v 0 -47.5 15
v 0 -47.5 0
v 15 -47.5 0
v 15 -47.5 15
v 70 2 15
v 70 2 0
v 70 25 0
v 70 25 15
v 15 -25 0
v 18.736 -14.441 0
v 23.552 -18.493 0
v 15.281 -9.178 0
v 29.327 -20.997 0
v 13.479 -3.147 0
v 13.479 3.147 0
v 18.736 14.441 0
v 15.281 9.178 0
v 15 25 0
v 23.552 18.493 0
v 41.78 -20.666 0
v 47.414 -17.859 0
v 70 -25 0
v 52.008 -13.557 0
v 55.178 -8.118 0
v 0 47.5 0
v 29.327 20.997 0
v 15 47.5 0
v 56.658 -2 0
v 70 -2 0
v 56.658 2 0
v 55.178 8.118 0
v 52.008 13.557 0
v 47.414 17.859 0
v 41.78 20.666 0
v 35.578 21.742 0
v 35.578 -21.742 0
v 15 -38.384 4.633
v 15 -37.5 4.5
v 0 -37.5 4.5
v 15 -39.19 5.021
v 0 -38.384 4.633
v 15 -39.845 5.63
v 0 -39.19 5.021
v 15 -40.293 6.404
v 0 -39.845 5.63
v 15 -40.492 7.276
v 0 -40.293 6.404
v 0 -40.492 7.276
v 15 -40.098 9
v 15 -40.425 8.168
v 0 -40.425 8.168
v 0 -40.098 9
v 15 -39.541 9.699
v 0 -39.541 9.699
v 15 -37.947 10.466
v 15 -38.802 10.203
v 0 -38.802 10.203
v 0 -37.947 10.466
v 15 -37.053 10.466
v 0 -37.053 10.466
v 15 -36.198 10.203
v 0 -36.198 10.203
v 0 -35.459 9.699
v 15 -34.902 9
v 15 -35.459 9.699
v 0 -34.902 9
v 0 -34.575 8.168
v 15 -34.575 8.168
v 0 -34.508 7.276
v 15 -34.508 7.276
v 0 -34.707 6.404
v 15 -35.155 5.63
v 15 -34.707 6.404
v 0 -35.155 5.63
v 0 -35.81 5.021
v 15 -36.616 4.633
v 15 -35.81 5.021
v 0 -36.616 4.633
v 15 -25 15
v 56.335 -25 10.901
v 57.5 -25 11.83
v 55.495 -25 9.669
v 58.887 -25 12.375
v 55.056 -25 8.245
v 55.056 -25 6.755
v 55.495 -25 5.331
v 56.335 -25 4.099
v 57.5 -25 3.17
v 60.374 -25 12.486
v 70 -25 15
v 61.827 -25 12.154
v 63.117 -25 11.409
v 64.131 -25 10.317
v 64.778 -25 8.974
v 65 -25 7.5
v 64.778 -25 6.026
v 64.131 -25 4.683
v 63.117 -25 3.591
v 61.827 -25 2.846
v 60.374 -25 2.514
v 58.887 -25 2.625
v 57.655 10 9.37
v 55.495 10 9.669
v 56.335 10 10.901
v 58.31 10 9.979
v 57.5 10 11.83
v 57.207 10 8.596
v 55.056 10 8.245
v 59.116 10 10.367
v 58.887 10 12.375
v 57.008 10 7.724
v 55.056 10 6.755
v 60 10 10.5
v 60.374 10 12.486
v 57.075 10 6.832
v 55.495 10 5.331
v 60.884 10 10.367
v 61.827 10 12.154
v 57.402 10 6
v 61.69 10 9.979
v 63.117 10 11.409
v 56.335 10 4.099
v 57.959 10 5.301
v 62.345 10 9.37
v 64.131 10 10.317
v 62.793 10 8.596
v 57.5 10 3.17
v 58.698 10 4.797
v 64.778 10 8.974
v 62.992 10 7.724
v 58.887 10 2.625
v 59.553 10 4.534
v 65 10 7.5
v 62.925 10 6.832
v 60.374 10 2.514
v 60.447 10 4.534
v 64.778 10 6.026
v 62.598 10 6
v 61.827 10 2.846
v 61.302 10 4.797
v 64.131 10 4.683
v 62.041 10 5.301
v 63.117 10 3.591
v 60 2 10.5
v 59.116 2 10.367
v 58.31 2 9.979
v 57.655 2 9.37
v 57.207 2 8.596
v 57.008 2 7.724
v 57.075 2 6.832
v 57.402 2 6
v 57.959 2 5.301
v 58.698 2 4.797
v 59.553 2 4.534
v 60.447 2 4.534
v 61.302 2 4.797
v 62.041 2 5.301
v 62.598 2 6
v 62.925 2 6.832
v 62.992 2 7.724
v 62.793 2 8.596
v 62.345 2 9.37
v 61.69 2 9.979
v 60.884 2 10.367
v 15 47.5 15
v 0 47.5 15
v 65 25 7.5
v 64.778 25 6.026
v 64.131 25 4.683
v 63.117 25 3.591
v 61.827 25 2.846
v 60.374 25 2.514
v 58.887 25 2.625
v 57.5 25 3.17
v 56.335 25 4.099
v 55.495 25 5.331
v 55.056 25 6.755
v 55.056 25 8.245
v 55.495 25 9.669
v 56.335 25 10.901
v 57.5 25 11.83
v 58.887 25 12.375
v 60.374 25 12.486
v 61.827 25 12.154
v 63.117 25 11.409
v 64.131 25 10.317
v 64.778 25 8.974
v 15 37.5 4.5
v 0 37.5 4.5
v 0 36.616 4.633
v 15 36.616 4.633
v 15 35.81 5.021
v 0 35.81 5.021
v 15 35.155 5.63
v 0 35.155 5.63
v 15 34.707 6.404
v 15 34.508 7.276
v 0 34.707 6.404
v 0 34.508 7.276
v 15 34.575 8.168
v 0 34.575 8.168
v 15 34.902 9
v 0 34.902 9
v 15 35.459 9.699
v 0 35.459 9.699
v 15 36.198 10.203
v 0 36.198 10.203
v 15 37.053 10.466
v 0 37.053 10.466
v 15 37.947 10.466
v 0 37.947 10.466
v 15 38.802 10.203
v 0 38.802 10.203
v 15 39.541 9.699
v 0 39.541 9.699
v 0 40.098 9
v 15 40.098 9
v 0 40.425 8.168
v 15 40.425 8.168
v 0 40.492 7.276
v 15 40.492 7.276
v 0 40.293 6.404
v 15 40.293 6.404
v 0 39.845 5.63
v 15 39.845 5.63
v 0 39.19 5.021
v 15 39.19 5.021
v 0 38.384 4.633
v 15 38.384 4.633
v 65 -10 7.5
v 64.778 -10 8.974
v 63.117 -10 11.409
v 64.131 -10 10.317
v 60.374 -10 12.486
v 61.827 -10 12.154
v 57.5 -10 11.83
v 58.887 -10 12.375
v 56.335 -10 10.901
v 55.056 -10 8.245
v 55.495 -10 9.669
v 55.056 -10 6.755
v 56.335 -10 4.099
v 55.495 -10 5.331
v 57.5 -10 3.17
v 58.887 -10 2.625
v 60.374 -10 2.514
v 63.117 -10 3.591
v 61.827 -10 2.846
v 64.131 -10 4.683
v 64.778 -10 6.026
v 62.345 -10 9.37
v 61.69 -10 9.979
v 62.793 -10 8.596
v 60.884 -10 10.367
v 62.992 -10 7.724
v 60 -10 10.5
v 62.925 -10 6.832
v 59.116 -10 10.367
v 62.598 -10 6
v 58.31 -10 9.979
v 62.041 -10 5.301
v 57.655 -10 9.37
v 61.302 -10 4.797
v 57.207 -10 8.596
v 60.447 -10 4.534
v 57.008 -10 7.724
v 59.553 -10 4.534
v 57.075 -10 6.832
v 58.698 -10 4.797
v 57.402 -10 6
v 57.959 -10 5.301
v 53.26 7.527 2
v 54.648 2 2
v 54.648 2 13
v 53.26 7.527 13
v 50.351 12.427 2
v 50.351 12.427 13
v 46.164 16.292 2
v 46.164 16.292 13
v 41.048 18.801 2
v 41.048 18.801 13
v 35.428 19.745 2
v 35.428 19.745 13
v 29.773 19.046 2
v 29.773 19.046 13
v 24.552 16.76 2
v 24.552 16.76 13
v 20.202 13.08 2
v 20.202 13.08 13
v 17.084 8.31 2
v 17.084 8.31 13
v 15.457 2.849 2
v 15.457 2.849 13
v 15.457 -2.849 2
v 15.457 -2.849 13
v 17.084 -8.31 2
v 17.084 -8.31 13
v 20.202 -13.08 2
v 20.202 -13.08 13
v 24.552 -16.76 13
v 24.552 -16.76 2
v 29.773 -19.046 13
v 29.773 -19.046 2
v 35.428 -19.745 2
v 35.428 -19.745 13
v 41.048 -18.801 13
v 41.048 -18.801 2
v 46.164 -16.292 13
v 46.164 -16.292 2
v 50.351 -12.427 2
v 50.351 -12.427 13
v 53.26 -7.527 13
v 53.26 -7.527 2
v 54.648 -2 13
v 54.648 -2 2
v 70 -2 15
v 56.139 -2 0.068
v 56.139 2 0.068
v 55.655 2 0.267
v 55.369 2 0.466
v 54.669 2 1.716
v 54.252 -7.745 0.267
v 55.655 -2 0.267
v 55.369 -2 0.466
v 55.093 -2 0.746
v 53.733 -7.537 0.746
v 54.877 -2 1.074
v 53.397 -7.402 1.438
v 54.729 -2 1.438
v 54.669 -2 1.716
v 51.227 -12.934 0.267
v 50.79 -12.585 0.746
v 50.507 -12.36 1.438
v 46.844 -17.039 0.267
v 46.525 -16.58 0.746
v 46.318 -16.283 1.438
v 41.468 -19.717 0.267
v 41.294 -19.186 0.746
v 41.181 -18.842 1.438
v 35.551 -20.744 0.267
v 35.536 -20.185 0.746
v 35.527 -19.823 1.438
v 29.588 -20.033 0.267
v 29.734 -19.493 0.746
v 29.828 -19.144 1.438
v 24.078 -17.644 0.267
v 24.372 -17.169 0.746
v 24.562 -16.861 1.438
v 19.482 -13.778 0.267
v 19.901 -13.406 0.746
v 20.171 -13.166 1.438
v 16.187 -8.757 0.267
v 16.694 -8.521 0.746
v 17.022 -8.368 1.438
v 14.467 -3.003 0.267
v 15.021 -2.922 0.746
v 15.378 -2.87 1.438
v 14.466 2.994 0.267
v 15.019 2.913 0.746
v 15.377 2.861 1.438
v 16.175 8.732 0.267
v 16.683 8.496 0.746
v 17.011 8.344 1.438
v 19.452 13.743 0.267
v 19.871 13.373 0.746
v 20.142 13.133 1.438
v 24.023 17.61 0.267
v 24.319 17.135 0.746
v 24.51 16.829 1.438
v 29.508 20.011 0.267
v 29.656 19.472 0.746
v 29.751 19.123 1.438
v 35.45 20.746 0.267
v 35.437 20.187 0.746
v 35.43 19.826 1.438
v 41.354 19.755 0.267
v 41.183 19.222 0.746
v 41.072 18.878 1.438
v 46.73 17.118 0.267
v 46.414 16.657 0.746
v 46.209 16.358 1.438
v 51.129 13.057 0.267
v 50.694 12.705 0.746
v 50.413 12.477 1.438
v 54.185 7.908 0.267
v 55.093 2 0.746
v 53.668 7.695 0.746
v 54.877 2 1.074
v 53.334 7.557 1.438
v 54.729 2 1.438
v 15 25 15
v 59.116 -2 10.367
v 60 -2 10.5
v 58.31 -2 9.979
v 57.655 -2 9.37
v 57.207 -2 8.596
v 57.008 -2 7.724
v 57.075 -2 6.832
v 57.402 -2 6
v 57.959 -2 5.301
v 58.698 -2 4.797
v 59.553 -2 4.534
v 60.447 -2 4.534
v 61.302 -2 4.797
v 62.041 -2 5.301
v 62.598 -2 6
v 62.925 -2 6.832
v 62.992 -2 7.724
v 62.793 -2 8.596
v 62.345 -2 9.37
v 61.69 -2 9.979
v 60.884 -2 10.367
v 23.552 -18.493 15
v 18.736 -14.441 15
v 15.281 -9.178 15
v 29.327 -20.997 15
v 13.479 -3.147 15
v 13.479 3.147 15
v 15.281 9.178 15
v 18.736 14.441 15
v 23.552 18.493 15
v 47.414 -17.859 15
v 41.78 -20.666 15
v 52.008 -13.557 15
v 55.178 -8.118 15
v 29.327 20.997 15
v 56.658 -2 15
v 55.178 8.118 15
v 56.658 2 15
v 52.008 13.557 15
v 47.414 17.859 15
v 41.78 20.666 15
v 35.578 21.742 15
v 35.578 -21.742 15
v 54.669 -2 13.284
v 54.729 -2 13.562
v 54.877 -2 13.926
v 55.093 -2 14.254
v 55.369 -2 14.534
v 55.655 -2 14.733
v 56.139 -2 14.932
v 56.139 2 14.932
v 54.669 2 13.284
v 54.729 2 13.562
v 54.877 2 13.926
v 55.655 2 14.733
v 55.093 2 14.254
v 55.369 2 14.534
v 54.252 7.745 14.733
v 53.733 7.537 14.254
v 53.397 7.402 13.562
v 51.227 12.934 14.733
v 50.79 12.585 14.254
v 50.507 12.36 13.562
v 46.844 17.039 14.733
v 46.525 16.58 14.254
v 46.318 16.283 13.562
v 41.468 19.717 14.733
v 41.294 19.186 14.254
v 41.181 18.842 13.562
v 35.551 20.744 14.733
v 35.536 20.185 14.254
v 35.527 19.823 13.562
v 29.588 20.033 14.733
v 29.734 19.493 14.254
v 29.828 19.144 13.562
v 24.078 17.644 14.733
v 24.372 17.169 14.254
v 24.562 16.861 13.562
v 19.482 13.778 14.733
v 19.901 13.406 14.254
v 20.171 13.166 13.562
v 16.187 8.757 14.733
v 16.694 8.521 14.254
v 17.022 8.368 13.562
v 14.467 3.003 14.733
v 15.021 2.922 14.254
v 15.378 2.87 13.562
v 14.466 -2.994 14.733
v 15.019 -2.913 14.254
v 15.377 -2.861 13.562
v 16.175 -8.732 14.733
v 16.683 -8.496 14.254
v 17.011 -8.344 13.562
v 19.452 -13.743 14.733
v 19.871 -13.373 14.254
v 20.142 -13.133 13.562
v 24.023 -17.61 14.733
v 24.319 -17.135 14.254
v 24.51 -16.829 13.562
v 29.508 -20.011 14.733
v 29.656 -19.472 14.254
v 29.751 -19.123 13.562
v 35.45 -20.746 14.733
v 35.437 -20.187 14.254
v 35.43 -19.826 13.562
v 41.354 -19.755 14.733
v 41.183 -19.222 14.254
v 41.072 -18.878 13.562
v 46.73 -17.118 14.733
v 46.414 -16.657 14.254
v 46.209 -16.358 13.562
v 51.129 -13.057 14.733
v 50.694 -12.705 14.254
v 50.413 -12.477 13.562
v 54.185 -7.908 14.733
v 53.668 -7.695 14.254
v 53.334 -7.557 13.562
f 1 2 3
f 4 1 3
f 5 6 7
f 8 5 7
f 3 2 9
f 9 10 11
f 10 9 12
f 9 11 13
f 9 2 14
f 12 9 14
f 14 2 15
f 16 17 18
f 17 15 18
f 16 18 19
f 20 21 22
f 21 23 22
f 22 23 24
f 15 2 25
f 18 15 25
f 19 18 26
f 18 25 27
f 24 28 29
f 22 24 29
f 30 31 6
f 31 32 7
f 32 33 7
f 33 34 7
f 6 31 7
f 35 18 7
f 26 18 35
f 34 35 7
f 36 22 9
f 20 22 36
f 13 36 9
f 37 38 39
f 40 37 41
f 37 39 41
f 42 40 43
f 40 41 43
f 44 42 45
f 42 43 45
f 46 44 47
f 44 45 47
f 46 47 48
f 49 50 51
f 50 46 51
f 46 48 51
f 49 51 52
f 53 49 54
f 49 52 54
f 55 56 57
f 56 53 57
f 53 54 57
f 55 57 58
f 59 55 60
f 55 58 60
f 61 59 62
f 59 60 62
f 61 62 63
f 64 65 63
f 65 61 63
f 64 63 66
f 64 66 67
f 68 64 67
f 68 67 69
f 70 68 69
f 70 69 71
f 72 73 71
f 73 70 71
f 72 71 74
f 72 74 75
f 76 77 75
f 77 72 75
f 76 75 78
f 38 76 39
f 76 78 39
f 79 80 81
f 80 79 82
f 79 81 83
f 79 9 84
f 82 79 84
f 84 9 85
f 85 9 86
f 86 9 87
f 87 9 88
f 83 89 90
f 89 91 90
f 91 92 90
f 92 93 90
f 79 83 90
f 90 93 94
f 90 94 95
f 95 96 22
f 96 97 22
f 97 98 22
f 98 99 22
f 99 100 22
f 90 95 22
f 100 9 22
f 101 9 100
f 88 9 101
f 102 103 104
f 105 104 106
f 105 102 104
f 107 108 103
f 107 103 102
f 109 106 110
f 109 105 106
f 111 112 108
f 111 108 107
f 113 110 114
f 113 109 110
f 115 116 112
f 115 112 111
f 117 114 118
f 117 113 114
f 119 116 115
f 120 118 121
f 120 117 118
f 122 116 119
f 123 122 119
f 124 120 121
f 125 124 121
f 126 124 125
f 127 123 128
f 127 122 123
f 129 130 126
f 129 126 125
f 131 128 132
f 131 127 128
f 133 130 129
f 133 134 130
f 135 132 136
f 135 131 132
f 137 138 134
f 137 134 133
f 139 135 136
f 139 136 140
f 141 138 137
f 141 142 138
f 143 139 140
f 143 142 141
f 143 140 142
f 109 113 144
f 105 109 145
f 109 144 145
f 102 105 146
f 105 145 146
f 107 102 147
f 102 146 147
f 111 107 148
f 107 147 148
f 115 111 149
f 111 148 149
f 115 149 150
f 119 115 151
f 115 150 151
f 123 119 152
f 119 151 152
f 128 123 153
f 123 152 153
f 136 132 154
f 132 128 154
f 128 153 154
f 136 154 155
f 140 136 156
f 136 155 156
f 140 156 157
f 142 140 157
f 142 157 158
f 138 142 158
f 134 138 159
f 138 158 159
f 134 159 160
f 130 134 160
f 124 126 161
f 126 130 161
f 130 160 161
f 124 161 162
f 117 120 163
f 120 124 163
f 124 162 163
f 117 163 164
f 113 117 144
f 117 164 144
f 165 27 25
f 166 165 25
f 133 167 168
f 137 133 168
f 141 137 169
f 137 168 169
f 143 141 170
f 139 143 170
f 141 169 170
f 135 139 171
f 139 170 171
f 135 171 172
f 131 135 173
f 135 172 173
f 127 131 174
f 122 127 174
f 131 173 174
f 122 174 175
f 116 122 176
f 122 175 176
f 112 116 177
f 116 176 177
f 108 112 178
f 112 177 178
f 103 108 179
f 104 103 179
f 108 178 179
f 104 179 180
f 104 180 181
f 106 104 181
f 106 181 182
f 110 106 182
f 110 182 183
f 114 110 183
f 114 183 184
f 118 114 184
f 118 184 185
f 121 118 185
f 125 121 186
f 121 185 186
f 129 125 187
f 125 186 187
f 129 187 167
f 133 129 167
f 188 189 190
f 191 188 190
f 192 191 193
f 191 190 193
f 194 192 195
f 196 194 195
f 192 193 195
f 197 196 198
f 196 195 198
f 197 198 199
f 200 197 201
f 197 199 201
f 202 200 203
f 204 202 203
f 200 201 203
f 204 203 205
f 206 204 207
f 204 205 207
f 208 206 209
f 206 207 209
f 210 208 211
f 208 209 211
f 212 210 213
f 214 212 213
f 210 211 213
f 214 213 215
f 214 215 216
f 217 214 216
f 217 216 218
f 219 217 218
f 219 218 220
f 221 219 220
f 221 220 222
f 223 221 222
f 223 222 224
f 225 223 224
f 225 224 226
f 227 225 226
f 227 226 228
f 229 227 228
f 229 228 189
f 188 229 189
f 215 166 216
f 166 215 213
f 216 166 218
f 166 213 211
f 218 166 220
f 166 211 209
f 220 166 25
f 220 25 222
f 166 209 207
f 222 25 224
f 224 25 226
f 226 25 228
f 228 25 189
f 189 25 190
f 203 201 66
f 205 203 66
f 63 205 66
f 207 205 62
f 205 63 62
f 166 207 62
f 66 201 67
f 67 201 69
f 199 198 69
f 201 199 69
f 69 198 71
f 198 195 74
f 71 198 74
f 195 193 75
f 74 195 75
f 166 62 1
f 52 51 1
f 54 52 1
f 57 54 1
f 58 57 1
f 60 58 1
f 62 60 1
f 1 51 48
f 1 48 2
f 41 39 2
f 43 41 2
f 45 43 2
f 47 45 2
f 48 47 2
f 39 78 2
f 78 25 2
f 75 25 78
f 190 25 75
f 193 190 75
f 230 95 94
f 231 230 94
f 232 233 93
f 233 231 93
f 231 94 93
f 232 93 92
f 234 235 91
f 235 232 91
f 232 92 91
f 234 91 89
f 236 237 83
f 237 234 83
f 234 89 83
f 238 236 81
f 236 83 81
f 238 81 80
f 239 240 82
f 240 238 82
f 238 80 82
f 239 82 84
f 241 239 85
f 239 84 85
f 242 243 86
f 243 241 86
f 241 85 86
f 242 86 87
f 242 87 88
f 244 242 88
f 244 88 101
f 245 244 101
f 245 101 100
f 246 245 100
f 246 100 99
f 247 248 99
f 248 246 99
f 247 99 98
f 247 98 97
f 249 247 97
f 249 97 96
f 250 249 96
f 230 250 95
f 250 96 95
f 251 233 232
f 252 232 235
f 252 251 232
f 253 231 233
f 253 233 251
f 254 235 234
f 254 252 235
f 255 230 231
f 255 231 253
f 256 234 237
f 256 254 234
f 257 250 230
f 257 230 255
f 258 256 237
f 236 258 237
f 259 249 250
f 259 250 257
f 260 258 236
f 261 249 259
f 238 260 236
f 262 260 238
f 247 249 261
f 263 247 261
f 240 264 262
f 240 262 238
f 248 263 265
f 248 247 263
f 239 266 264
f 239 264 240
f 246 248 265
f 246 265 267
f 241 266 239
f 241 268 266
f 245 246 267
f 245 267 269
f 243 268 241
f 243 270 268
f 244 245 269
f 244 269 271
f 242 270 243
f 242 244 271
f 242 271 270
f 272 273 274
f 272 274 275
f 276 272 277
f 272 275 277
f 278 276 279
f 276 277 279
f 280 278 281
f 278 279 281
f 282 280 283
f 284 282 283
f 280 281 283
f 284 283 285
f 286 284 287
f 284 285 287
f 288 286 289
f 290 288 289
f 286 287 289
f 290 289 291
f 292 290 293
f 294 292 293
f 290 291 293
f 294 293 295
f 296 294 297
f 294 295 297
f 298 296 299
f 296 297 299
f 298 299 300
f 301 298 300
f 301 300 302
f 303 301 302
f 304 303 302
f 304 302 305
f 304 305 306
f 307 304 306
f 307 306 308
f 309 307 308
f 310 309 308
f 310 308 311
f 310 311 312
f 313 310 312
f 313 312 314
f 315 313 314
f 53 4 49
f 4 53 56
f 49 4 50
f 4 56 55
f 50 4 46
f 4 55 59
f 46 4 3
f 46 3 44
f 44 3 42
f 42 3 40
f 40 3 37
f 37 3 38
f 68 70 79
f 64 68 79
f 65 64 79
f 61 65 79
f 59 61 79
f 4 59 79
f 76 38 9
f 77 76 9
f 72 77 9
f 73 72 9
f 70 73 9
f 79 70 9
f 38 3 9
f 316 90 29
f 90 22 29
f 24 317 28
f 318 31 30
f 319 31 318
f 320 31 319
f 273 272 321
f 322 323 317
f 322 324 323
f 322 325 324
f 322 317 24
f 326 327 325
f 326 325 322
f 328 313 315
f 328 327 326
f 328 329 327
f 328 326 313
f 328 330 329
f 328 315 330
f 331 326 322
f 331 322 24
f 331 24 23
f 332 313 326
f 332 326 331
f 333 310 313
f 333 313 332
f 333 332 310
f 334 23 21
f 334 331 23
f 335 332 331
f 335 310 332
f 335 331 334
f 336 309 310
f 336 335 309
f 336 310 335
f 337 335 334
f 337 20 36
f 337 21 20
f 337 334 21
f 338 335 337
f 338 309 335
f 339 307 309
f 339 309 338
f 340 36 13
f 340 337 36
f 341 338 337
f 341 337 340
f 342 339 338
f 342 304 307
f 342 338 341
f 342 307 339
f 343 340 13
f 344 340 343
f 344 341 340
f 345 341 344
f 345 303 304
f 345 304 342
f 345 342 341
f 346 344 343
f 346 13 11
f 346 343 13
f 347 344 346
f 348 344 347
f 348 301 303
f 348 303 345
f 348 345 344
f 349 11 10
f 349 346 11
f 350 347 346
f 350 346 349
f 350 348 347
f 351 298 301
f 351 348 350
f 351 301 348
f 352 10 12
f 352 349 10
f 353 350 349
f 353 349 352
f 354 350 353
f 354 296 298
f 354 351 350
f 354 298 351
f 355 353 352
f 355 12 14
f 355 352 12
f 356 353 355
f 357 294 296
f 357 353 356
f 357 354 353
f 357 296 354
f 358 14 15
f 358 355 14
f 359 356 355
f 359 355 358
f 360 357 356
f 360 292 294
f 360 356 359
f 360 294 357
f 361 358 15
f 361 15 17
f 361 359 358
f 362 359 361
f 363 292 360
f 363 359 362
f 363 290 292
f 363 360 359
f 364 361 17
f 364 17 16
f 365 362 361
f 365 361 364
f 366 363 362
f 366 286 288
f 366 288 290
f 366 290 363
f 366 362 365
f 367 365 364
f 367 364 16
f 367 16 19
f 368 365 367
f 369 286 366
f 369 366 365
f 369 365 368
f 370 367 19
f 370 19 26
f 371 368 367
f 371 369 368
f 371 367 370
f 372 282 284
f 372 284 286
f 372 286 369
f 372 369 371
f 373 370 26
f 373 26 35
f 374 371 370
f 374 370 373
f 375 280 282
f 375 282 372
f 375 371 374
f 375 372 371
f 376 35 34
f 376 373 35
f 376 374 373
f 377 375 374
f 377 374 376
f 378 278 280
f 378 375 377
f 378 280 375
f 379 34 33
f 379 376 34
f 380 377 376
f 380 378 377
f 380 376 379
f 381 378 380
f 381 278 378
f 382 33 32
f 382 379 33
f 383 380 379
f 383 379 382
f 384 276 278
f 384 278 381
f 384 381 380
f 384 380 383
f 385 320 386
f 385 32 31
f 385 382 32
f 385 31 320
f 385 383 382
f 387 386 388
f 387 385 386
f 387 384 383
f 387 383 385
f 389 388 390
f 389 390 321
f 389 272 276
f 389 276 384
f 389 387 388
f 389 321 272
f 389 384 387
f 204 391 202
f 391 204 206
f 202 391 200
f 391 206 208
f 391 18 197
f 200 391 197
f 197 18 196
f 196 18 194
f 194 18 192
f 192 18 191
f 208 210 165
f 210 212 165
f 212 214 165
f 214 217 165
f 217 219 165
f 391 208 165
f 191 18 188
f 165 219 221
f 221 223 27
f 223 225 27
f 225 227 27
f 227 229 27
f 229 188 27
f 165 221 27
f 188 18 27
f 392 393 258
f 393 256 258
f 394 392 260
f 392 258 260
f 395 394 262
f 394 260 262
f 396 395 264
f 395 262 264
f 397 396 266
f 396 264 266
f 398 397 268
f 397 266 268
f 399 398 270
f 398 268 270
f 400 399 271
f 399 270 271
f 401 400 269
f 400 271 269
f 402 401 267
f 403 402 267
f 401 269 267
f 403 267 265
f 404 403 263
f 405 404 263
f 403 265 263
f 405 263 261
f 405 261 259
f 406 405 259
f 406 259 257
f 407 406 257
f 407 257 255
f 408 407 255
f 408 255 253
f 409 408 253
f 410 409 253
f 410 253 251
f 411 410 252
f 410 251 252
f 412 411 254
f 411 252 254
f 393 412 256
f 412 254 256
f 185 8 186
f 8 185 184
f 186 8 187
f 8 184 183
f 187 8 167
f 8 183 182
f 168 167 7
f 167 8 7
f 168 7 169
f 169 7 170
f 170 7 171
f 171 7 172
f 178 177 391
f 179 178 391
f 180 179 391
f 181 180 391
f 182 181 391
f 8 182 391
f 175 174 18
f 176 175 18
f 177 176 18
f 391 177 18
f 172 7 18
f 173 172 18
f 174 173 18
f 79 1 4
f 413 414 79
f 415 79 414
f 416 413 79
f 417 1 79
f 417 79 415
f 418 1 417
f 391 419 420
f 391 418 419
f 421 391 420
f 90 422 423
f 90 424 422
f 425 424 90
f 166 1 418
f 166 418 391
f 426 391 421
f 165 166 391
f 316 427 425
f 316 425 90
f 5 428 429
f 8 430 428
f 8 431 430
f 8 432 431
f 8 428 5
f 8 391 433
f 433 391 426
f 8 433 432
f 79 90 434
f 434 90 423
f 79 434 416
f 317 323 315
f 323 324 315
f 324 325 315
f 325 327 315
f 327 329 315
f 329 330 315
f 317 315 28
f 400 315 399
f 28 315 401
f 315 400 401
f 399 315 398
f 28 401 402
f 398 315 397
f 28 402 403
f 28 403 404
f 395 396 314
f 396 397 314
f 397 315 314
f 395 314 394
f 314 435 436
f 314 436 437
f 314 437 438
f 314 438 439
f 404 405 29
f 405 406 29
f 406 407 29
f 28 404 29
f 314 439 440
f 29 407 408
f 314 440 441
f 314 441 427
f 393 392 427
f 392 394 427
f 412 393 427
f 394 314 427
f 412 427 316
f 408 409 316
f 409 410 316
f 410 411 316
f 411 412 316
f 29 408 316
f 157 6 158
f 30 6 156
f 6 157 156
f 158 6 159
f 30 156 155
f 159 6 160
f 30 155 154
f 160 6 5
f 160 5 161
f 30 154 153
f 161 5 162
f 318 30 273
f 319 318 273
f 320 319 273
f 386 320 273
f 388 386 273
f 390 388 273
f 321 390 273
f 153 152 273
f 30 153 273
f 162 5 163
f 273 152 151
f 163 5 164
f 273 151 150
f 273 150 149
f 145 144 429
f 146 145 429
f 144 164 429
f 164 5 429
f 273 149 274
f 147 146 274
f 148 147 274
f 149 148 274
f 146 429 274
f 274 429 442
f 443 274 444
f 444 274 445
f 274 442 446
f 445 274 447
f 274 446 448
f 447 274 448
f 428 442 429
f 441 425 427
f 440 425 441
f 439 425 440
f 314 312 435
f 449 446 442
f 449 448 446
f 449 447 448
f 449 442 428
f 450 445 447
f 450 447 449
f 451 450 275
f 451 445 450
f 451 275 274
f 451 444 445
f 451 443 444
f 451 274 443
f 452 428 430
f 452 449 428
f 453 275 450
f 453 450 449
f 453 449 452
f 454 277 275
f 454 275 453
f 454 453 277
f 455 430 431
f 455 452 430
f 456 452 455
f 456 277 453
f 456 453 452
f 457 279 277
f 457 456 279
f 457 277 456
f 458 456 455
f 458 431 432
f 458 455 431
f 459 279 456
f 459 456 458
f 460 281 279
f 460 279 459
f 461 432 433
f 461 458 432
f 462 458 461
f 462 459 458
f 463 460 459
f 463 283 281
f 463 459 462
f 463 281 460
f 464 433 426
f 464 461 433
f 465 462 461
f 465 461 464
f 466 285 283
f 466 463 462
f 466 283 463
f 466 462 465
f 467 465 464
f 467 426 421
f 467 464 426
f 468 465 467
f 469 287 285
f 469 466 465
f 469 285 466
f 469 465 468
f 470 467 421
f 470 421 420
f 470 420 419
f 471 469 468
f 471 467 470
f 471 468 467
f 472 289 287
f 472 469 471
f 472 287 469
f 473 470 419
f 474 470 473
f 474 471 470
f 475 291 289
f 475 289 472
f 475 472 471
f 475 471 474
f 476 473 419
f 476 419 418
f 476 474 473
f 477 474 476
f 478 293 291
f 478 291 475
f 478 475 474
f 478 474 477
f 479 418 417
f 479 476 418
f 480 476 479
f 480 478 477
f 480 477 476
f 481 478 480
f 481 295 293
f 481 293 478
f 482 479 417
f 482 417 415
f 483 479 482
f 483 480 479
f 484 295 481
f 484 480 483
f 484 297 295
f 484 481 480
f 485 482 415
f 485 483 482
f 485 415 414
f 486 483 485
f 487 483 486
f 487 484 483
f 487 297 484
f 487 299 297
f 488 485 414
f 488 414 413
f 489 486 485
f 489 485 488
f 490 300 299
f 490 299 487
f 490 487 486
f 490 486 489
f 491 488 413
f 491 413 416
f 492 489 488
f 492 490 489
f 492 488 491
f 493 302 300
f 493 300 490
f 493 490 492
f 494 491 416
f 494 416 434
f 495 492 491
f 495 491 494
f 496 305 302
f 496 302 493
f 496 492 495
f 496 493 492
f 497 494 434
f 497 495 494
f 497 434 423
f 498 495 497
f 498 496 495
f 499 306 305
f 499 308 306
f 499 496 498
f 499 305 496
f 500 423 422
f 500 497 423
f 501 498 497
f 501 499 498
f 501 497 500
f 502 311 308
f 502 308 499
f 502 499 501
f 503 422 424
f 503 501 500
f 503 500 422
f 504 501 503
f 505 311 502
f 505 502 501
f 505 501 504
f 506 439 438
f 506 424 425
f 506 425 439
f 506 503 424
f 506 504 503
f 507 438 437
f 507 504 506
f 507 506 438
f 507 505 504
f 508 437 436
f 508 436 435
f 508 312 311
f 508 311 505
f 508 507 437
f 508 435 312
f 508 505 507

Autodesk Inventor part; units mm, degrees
ref_plane "YZ Plane" through (0, 0, 0) normal (1, 0, 0) x (0, 1, 0)
ref_plane "XZ Plane" through (0, 0, 0) normal (0, 1, 0) x (-1, 0, 0)
ref_plane "XY Plane" through (0, 0, 0) normal (0, 0, 1) x (1, 0, 0)
sketch "Sketch1" plane through (0, 0, 0) normal (0, 0, 1) x (1, 0, 0)
  line L0 (0, 0) -> (70, 0)
  line L1 (70, 0) -> (70, 25)
  line L2 (70, 25) -> (15, 25)
  line L3 (15, 25) -> (15, 47.5)
  line L4 (15, 47.5) -> (0, 47.5)
  line L5 (0, 47.5) -> (0, 0)
  point P0 (15, 36.25)
  point P1 (7.5, 47.5)
  dimension "d0" = 15
  dimension "d1" = 25
  dimension "d2" = 47.5
  dimension "d24" = 55
extrude "Extrusion1" add sketch "Sketch1" along normal blind 15
mirror "Mirror1" about plane through (0, 0, 0) normal (0, 1, 0) of "Extrusion1"
sketch "Sketch2" plane through (0, 0, 15) normal (0, 0, 1) x (1, 0, 0)
  circle A0 centre (35, 0) radius 19.75
  line L0 (-14, 0) -> (84, 0) projected
  line L1 (70, 25) -> (70, -25) projected
  line L2 (70, 2) -> (35, 2)
  line L3 (35, 2) -> (35, -2)
  line L4 (35, -2) -> (70, -2)
  line L5 (70, -2) -> (70, 2)
  point P0 (0, 0)
  point P1 (52.5, 2)
  point P2 (54.6485, 2)
  point P3 (54.6485, -2)
  dimension "d6" = 39.5
  dimension "d7" = 35
  dimension "d8" = 4
  dimension "d9" = 2
extrude "Extrusion2" cut sketch "Sketch2" against normal through all
sketch "Sketch3" plane through (15, 25, 0) normal (0, 1, 0) x (1, 0, 0)
  line L0 (55, 0) -> (0, 0) projected
  line L1 (55, 0) -> (55, -15) projected
  point P0 (-15, 0)
  point P1 (45, -7.5)
  dimension "d12" = 7.5
  dimension "d13" = 10
hole "Hole1" at (60, 25, 7.5) direction (0, -1, 0) diameter 6 end through all
sketch "Sketch4" plane through (15, 25, 0) normal (0, 1, 0) x (1, 0, 0)
  circle A0 centre (45, -7.5) radius 3 projected
  circle A1 centre (45, -7.5) radius 5
  point P0 (-15, 0)
  dimension "d21" = 10
extrude "Extrusion3" cut sketch "Sketch4" against normal blind 15
mirror "Mirror2" about plane through (0, 0, 0) normal (0, 1, 0) of "Extrusion3"
sketch "Sketch5" plane through (15, 25, 0) normal (1, 0, 0) x (0, 0, -1)
  line L0 (0, 0) -> (0, 22.5) projected
  line L1 (0, 22.5) -> (-15, 22.5) projected
  point P0 (0, -25)
  point P1 (-7.5, 12.5)
  point P2 (0, 11.25)
  dimension "d26" = 7.5
  dimension "d34" = 10
hole "Hole2" at (15, 37.5, 7.5) direction (-1, 0, 0) diameter 6 end through all
mirror "Mirror3" about plane through (0, 0, 0) normal (0, 1, 0) of "Hole2"
fillet "Fillet1" radius 2 2 edges at (15.25, 0, 15) (15.25, 0, 0)
equation "\"d9\" = 0.5 * d8"
properties part number "Magazine_Holder_3DPrint"
